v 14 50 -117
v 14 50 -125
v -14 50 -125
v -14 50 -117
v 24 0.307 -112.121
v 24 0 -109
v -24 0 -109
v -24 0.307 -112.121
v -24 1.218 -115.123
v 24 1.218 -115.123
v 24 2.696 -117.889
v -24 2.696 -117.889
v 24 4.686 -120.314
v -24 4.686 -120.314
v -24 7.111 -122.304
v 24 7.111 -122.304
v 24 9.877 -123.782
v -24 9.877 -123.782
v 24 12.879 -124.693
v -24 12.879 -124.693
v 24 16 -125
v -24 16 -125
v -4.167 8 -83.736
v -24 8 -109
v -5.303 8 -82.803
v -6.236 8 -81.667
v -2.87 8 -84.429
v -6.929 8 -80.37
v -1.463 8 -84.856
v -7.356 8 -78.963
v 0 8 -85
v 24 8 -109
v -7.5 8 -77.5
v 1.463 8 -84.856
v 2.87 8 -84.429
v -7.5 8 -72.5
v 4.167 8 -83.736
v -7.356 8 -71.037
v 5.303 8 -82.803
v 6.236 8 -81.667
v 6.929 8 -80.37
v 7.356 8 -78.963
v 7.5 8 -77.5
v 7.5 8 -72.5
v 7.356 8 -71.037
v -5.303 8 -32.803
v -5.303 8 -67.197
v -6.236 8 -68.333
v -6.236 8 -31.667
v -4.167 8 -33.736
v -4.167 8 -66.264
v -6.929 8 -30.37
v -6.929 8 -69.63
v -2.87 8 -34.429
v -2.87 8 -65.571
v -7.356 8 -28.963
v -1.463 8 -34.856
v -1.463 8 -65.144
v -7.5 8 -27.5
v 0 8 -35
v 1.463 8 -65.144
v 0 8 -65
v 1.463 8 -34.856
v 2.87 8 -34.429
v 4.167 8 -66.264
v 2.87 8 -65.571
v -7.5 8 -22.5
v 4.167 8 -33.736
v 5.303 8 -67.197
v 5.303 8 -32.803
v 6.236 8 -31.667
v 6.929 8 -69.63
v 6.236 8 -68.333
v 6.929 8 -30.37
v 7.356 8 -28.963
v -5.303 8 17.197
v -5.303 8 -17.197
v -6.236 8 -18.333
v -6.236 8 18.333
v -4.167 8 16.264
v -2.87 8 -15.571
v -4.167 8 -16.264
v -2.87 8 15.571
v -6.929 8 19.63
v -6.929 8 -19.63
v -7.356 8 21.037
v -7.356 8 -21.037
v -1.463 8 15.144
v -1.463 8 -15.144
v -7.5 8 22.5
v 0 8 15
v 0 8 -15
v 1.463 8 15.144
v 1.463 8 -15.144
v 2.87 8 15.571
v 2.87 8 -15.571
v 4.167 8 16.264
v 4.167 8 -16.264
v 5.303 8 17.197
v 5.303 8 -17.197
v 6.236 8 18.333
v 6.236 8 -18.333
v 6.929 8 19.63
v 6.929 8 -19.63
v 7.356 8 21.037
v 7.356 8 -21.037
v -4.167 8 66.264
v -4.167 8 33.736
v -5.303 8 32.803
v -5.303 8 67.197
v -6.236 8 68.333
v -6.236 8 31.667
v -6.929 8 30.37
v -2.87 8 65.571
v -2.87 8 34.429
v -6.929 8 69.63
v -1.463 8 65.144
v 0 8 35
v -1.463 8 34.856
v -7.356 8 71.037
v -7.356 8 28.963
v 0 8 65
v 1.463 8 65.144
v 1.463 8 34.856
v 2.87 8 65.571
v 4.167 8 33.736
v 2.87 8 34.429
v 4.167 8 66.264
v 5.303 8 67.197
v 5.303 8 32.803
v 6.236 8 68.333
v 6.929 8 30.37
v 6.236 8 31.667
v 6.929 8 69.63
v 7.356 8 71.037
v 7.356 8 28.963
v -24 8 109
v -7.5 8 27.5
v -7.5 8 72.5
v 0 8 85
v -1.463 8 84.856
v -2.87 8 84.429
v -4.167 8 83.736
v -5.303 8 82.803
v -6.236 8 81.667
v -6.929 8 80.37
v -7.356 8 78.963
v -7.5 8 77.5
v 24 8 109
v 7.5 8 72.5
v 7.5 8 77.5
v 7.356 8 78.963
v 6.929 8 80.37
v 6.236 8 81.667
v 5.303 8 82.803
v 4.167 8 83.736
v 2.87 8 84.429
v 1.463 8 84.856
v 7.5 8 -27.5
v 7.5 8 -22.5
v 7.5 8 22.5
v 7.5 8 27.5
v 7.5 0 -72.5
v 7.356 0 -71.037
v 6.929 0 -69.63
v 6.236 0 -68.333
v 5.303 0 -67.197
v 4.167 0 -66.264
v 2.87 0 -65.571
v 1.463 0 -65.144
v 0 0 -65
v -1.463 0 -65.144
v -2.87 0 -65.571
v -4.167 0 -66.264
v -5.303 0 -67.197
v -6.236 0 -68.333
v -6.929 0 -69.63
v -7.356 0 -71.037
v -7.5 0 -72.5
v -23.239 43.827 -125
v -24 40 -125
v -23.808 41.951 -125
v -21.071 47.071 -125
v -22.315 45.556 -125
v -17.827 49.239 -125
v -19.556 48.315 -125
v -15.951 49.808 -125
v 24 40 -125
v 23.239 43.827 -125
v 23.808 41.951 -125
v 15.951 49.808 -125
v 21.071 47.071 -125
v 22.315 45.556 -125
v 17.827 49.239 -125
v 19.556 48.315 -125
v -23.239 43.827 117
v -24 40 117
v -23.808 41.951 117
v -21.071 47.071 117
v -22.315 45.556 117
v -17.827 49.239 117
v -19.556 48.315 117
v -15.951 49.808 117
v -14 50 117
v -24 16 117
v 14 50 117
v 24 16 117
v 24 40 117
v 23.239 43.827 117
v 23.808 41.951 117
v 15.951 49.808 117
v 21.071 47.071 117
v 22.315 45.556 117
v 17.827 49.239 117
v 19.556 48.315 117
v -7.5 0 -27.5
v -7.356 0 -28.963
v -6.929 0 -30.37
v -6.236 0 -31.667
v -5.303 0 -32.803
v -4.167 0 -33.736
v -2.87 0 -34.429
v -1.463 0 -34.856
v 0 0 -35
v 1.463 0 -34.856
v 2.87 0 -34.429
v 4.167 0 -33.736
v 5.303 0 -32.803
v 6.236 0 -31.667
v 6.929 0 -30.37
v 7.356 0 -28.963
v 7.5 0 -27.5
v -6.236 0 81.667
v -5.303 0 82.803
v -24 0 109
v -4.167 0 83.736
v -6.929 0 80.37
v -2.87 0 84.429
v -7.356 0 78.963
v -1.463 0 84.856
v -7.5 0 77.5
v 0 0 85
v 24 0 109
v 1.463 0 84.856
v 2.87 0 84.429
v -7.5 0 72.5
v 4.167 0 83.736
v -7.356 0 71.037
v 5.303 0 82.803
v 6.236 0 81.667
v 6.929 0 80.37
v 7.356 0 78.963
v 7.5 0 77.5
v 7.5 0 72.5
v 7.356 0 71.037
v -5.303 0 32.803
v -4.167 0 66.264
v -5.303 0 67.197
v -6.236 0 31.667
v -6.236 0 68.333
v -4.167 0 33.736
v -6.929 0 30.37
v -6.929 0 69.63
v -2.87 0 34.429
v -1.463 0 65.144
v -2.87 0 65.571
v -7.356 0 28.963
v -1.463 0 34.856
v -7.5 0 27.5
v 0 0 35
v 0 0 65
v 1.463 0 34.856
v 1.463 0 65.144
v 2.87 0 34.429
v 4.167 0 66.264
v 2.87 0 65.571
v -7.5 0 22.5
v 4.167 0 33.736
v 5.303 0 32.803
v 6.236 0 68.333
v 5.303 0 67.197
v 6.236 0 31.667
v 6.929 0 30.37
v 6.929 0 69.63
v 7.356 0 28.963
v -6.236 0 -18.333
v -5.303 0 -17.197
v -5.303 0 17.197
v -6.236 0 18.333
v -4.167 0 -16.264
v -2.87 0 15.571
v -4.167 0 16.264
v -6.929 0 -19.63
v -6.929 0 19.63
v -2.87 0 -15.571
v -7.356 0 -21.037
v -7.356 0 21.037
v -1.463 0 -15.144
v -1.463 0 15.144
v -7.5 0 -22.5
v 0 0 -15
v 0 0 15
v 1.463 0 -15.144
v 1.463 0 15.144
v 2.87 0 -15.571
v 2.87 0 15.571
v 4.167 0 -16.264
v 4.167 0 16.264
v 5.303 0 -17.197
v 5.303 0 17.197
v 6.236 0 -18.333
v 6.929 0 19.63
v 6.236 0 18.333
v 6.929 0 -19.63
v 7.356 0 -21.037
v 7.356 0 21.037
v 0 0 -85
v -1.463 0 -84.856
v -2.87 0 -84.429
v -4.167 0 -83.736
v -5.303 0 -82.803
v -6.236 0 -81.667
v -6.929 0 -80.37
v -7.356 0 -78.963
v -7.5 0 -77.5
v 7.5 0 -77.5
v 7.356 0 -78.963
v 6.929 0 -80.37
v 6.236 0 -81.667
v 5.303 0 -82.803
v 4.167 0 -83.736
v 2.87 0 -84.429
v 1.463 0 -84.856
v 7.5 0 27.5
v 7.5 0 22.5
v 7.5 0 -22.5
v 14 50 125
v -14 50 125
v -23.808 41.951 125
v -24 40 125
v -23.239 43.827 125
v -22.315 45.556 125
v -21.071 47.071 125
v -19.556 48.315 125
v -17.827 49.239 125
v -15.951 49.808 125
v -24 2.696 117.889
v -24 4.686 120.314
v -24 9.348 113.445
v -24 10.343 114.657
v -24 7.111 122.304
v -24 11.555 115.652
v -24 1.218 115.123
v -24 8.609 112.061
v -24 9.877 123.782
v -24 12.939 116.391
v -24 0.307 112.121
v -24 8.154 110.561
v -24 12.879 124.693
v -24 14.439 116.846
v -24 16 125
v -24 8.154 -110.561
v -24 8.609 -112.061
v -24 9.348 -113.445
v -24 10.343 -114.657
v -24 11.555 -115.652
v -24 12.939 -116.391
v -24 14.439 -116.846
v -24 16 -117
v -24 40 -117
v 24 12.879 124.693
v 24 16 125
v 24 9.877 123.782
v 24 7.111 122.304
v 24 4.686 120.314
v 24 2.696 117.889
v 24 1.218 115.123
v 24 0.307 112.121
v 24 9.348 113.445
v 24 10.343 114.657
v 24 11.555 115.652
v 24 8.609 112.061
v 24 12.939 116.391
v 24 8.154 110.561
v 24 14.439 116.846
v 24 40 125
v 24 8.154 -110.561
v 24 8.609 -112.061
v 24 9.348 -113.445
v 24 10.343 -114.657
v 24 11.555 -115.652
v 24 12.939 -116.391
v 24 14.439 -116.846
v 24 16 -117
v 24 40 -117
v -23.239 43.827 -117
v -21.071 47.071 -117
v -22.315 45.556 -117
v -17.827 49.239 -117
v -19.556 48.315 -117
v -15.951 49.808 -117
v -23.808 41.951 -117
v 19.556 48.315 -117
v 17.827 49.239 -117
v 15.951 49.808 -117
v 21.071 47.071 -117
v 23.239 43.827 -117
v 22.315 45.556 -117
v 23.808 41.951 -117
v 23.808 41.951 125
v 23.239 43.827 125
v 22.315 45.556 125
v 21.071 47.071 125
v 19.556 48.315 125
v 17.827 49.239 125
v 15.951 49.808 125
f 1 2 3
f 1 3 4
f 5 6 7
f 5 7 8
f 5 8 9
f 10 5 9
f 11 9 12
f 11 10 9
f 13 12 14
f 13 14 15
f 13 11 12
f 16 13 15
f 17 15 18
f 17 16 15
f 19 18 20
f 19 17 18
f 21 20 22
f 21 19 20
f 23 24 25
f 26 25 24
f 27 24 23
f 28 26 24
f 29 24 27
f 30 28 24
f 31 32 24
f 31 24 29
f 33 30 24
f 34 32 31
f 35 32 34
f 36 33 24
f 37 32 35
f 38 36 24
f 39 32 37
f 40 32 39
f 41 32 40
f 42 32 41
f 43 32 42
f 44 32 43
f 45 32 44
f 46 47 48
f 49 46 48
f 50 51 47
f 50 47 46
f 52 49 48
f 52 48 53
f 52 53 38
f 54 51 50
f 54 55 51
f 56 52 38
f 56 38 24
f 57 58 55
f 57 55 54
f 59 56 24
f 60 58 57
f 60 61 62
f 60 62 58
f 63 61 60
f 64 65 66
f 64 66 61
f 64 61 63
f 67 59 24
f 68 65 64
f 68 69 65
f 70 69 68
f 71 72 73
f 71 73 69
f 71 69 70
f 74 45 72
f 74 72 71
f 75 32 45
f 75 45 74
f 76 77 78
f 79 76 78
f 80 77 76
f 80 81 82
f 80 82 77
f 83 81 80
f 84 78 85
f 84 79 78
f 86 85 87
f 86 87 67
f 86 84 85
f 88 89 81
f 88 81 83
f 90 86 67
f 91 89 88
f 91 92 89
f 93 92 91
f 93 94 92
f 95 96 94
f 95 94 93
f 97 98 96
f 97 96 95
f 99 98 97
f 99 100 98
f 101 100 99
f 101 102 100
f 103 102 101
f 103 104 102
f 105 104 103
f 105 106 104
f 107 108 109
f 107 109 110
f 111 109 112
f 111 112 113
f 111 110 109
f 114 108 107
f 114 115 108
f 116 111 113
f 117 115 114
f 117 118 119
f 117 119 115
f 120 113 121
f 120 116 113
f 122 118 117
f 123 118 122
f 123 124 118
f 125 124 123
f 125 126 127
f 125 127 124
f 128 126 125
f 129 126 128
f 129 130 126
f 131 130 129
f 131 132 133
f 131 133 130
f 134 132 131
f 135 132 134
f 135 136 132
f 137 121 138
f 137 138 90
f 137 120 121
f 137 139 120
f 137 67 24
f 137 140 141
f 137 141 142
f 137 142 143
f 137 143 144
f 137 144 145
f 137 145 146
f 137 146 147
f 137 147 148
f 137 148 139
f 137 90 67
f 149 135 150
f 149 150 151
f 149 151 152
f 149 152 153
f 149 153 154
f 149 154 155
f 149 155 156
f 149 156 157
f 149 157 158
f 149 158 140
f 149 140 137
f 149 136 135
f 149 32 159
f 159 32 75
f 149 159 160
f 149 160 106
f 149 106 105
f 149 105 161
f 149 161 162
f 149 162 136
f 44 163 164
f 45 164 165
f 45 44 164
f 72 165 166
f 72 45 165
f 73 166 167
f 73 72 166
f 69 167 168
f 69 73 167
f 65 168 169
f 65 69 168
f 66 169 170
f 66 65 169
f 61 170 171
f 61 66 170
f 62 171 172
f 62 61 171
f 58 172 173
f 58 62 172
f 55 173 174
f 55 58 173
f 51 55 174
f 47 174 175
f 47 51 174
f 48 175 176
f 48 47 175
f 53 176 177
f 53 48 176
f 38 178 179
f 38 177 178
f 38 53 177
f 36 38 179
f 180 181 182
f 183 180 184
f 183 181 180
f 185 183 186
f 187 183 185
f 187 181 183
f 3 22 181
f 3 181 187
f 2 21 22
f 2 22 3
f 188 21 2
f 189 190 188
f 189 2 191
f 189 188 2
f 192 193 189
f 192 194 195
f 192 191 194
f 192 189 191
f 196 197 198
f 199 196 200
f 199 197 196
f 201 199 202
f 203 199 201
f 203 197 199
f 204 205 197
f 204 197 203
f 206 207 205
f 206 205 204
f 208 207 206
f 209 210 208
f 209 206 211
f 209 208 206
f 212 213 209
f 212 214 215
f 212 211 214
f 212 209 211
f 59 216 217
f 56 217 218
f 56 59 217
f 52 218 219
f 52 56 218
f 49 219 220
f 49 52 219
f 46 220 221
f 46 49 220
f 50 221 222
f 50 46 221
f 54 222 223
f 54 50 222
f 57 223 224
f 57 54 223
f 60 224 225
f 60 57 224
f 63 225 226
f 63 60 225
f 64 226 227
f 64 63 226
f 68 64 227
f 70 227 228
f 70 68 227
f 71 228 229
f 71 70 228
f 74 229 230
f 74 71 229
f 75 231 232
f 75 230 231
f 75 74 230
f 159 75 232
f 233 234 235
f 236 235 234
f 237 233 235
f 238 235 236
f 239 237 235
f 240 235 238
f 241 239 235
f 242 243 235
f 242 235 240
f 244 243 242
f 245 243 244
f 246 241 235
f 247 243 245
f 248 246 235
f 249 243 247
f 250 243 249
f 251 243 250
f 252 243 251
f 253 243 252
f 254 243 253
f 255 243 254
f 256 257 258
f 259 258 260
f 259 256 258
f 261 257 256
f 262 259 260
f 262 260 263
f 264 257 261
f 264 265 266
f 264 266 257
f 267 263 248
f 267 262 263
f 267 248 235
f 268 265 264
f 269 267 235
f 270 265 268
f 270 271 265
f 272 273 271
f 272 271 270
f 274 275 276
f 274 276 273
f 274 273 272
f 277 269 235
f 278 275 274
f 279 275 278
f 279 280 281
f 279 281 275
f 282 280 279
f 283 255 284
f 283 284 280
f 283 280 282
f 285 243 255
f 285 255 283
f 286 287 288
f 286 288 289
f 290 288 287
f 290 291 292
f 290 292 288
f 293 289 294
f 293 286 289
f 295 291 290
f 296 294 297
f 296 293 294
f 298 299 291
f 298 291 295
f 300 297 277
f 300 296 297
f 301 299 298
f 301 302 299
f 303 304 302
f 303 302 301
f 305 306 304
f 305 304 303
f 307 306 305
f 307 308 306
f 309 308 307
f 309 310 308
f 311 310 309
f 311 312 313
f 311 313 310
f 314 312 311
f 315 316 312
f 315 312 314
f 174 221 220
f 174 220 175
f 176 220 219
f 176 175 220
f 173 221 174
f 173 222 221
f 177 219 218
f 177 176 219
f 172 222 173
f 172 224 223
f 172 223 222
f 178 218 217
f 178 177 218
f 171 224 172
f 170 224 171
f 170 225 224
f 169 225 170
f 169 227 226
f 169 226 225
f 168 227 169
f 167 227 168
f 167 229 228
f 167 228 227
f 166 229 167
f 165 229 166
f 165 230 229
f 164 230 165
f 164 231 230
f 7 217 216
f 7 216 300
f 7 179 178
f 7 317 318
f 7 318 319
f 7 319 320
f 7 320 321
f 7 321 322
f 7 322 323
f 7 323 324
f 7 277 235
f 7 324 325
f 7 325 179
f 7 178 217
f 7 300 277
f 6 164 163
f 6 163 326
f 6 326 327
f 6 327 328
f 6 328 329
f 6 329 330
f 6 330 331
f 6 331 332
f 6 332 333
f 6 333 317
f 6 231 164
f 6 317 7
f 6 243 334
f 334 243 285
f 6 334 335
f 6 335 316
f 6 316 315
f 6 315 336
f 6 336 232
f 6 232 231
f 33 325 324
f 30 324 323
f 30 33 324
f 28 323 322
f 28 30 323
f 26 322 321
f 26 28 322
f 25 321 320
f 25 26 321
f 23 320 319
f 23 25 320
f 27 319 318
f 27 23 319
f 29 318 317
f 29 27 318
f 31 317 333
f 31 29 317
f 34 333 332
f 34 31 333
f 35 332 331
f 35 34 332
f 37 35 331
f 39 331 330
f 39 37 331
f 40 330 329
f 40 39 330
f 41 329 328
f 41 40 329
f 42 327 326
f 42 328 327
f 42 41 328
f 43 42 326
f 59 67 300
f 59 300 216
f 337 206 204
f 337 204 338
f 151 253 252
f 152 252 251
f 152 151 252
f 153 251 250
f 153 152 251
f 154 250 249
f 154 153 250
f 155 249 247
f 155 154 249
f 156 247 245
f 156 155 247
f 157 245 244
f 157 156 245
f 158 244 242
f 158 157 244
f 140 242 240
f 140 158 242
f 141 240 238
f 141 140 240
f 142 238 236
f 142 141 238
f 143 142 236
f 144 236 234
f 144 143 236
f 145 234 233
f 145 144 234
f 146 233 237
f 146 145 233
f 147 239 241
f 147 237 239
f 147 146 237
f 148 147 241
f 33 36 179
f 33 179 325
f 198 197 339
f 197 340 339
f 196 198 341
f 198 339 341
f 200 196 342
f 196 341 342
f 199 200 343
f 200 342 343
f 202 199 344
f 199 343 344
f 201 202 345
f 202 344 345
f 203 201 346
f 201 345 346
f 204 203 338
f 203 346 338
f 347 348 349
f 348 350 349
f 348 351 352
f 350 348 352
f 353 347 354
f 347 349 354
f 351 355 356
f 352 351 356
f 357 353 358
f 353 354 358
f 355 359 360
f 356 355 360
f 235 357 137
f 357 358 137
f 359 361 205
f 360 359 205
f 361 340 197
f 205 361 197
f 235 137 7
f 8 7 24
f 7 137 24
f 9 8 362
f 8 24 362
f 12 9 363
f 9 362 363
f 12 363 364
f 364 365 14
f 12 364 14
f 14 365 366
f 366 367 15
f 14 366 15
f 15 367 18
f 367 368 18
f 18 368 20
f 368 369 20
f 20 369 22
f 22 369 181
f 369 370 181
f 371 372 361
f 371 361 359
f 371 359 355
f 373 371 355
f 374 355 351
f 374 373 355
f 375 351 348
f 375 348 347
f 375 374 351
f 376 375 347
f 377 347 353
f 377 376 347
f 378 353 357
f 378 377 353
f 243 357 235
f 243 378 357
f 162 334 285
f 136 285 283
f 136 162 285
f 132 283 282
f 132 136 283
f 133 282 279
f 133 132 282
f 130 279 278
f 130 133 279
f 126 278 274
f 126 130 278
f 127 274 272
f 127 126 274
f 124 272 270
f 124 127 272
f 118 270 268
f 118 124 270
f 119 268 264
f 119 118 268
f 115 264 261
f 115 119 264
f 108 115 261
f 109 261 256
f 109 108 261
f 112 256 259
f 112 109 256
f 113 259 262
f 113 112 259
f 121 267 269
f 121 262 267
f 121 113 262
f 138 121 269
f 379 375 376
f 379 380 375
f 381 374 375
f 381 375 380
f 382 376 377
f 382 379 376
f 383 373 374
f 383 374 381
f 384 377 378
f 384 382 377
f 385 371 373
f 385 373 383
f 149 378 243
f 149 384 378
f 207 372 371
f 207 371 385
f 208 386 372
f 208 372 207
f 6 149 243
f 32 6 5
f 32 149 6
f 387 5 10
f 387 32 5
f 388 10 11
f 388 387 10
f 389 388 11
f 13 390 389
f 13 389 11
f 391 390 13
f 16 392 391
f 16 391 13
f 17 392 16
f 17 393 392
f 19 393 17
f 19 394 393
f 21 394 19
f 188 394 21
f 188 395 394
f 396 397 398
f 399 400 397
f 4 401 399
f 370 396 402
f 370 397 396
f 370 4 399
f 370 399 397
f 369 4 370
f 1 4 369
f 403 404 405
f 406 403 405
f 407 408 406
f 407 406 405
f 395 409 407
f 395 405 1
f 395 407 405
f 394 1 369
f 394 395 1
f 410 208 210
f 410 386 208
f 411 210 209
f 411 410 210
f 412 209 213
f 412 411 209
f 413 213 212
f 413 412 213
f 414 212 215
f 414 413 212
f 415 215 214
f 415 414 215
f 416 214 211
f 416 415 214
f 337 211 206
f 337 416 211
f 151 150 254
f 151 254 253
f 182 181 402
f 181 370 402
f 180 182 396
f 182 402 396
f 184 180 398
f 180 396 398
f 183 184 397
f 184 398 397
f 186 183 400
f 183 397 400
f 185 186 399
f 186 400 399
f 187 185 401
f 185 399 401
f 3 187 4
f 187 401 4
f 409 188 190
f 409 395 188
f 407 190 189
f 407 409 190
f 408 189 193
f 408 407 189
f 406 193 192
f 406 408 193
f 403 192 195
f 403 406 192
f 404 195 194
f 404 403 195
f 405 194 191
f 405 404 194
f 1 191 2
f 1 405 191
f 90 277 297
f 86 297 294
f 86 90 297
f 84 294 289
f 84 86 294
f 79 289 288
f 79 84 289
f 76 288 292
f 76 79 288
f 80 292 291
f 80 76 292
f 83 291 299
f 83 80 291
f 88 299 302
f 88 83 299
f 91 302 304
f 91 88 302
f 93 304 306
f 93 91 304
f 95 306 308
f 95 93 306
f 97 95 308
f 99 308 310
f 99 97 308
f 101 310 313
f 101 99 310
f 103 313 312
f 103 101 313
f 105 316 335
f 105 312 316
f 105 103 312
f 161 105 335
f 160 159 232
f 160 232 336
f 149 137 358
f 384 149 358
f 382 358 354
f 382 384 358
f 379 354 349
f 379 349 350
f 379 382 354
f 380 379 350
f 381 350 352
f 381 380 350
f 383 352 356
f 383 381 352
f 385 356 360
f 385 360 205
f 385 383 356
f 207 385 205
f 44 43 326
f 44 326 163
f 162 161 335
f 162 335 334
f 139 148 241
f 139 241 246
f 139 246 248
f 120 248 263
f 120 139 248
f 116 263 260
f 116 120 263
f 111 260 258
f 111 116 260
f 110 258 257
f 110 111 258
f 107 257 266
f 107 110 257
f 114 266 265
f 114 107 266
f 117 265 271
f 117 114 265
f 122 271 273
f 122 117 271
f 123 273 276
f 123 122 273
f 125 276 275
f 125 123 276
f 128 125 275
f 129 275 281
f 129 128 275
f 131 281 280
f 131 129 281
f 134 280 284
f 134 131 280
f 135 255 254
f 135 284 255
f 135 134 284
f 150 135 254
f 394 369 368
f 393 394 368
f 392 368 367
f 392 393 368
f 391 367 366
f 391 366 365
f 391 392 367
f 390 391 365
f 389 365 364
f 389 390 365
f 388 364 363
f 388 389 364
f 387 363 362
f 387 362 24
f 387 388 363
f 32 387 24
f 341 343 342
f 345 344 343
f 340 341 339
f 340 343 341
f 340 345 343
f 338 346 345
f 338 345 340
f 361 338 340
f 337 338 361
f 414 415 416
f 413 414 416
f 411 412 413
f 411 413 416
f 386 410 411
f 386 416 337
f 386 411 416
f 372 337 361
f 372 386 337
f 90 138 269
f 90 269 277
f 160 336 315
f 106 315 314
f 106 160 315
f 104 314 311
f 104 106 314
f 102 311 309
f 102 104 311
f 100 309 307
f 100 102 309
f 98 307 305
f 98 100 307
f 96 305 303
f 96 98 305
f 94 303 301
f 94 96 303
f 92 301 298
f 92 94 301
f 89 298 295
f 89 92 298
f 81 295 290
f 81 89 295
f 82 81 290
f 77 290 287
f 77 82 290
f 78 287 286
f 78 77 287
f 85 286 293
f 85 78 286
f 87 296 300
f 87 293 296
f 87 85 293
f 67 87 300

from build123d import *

# Parameters (mm, degrees)
SM_BASE_FLANGE_1_DEPTH = 24
CUT_EXTRUDE_1_DEPTH    = 135.033577883
FILLET_1_R             = 10


# Sheet-metal steps are written as plain solids
with BuildPart() as part:
    # Sketch 1 → 基体-法兰1 (new, symmetric)
    with BuildSketch(Plane(origin=(0, 0, 0), x_dir=(0, 0, -1), z_dir=(1, 0, 0))):
        with BuildLine():
            Line((-125, 50), (-125, 16))
            ThreePointArc((-125, 16), (-120.313708499, 4.686291501), (-109, 0))
            Line((-109, 0), (109, 0))
            ThreePointArc((109, 0), (120.313708499, 4.686291501), (125, 16))
            Line((125, 16), (125, 50))
            Line((125, 50), (117, 50))
            Line((117, 50), (117, 16))
            ThreePointArc((117, 16), (114.656854249, 10.343145751), (109, 8))
            Line((109, 8), (-109, 8))
            ThreePointArc((-109, 8), (-114.656854249, 10.343145751), (-117, 16))
            Line((-117, 16), (-117, 50))
            Line((-117, 50), (-125, 50))
        make_face()
    extrude(amount=SM_BASE_FLANGE_1_DEPTH, both=True)

    # 草图6 → 切除-拉伸1 (cut, through all)
    with BuildSketch(Plane(origin=(0, 8, 0), x_dir=(1, 0, 0), z_dir=(0, 1, 0))):
        with BuildLine():
            Line((7.5, 77.5), (7.5, 72.5))
            ThreePointArc((7.5, 72.5), (0, 65), (-7.5, 72.5))
            Line((-7.5, 72.5), (-7.5, 77.5))
            ThreePointArc((-7.5, 77.5), (0, 85), (7.5, 77.5))
        make_face()
        with BuildLine():
            Line((7.5, 27.5), (7.5, 22.5))
            ThreePointArc((7.5, 22.5), (0, 15), (-7.5, 22.5))
            Line((-7.5, 22.5), (-7.5, 27.5))
            ThreePointArc((-7.5, 27.5), (0, 35), (7.5, 27.5))
        make_face()
        with BuildLine():
            Line((7.5, -22.5), (7.5, -27.5))
            ThreePointArc((7.5, -27.5), (0, -35), (-7.5, -27.5))
            Line((-7.5, -27.5), (-7.5, -22.5))
            ThreePointArc((-7.5, -22.5), (0, -15), (7.5, -22.5))
        make_face()
        with BuildLine():
            Line((7.5, -72.5), (7.5, -77.5))
            ThreePointArc((7.5, -77.5), (0, -85), (-7.5, -77.5))
            Line((-7.5, -77.5), (-7.5, -72.5))
            ThreePointArc((-7.5, -72.5), (0, -65), (7.5, -72.5))
        make_face()
    extrude(amount=-CUT_EXTRUDE_1_DEPTH, mode=Mode.SUBTRACT)

    # 圆角1
    fillet_1_edges = [part.edges().sort_by_distance(p)[0] for p in [
        (-24, 50, 121),
        (-24, 50, -121),
        (24, 50, 121),
        (24, 50, -121),
    ]]
    fillet(fillet_1_edges, radius=FILLET_1_R)


solid = part.part
